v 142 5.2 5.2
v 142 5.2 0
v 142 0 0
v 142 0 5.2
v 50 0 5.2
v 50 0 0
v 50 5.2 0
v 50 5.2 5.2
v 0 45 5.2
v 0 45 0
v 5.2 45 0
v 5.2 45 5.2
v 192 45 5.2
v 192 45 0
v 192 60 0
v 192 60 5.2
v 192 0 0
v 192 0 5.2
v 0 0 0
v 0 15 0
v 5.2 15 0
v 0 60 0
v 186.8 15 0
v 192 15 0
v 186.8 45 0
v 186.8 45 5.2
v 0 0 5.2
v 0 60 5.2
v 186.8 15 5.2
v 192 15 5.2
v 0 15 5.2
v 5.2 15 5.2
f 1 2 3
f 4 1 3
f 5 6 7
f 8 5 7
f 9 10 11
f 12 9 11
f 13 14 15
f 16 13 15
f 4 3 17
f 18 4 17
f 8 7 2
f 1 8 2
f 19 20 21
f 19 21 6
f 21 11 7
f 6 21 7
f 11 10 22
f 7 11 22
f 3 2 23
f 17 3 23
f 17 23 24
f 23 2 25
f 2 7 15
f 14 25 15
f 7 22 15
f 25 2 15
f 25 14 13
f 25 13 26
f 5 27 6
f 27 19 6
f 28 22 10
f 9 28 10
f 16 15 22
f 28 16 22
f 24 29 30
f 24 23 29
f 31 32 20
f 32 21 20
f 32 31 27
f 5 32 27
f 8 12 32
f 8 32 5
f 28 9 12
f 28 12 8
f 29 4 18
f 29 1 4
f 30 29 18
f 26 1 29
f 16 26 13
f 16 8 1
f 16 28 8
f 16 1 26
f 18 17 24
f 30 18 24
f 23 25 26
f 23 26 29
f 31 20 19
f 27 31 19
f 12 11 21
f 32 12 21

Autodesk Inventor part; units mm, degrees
ref_plane "YZ Plane" through (0, 0, 0) normal (1, 0, 0) x (0, 1, 0)
ref_plane "XZ Plane" through (0, 0, 0) normal (0, 1, 0) x (-1, 0, 0)
ref_plane "XY Plane" through (0, 0, 0) normal (0, 0, 1) x (1, 0, 0)
sketch "Sketch1" plane through (0, 0, 0) normal (0, 0, 1) x (1, 0, 0)
  line L0 (0, 0) -> (192, 0)
  line L1 (192, 0) -> (192, 60)
  line L2 (192, 60) -> (0, 60)
  line L3 (0, 60) -> (0, 0)
  line L4 (192, 45) -> (186.8, 45)
  line L5 (186.8, 45) -> (186.8, 15)
  line L6 (186.8, 15) -> (192, 15)
  line L7 (192, 15) -> (192, 45)
  line L8 (0, 45) -> (5.2, 45)
  line L9 (5.2, 45) -> (5.2, 15)
  line L10 (5.2, 15) -> (0, 15)
  line L11 (0, 15) -> (0, 45)
  line L12 (142, 0) -> (50, 0)
  line L13 (50, 0) -> (50, 5.2)
  line L14 (50, 5.2) -> (142, 5.2)
  line L15 (142, 5.2) -> (142, 0)
  dimension "d0" = 60
  dimension "d1" = 192
  dimension "d4" = 5.2
  dimension "d5" = 30
  dimension "d6" = 15
  dimension "d7" = 30
  dimension "d8" = 5.2
  dimension "d9" = 15
  dimension "d12" = 50
  dimension "d13" = 50
  dimension "d14" = 5.2
extrude "Extrusion3" add sketch "Sketch1" along normal blind 5.2 contours L3 L10 L9 L8 L2 L1 L4 L5 L6 L0 L15 L14 L13
properties part number "Back Plate"
